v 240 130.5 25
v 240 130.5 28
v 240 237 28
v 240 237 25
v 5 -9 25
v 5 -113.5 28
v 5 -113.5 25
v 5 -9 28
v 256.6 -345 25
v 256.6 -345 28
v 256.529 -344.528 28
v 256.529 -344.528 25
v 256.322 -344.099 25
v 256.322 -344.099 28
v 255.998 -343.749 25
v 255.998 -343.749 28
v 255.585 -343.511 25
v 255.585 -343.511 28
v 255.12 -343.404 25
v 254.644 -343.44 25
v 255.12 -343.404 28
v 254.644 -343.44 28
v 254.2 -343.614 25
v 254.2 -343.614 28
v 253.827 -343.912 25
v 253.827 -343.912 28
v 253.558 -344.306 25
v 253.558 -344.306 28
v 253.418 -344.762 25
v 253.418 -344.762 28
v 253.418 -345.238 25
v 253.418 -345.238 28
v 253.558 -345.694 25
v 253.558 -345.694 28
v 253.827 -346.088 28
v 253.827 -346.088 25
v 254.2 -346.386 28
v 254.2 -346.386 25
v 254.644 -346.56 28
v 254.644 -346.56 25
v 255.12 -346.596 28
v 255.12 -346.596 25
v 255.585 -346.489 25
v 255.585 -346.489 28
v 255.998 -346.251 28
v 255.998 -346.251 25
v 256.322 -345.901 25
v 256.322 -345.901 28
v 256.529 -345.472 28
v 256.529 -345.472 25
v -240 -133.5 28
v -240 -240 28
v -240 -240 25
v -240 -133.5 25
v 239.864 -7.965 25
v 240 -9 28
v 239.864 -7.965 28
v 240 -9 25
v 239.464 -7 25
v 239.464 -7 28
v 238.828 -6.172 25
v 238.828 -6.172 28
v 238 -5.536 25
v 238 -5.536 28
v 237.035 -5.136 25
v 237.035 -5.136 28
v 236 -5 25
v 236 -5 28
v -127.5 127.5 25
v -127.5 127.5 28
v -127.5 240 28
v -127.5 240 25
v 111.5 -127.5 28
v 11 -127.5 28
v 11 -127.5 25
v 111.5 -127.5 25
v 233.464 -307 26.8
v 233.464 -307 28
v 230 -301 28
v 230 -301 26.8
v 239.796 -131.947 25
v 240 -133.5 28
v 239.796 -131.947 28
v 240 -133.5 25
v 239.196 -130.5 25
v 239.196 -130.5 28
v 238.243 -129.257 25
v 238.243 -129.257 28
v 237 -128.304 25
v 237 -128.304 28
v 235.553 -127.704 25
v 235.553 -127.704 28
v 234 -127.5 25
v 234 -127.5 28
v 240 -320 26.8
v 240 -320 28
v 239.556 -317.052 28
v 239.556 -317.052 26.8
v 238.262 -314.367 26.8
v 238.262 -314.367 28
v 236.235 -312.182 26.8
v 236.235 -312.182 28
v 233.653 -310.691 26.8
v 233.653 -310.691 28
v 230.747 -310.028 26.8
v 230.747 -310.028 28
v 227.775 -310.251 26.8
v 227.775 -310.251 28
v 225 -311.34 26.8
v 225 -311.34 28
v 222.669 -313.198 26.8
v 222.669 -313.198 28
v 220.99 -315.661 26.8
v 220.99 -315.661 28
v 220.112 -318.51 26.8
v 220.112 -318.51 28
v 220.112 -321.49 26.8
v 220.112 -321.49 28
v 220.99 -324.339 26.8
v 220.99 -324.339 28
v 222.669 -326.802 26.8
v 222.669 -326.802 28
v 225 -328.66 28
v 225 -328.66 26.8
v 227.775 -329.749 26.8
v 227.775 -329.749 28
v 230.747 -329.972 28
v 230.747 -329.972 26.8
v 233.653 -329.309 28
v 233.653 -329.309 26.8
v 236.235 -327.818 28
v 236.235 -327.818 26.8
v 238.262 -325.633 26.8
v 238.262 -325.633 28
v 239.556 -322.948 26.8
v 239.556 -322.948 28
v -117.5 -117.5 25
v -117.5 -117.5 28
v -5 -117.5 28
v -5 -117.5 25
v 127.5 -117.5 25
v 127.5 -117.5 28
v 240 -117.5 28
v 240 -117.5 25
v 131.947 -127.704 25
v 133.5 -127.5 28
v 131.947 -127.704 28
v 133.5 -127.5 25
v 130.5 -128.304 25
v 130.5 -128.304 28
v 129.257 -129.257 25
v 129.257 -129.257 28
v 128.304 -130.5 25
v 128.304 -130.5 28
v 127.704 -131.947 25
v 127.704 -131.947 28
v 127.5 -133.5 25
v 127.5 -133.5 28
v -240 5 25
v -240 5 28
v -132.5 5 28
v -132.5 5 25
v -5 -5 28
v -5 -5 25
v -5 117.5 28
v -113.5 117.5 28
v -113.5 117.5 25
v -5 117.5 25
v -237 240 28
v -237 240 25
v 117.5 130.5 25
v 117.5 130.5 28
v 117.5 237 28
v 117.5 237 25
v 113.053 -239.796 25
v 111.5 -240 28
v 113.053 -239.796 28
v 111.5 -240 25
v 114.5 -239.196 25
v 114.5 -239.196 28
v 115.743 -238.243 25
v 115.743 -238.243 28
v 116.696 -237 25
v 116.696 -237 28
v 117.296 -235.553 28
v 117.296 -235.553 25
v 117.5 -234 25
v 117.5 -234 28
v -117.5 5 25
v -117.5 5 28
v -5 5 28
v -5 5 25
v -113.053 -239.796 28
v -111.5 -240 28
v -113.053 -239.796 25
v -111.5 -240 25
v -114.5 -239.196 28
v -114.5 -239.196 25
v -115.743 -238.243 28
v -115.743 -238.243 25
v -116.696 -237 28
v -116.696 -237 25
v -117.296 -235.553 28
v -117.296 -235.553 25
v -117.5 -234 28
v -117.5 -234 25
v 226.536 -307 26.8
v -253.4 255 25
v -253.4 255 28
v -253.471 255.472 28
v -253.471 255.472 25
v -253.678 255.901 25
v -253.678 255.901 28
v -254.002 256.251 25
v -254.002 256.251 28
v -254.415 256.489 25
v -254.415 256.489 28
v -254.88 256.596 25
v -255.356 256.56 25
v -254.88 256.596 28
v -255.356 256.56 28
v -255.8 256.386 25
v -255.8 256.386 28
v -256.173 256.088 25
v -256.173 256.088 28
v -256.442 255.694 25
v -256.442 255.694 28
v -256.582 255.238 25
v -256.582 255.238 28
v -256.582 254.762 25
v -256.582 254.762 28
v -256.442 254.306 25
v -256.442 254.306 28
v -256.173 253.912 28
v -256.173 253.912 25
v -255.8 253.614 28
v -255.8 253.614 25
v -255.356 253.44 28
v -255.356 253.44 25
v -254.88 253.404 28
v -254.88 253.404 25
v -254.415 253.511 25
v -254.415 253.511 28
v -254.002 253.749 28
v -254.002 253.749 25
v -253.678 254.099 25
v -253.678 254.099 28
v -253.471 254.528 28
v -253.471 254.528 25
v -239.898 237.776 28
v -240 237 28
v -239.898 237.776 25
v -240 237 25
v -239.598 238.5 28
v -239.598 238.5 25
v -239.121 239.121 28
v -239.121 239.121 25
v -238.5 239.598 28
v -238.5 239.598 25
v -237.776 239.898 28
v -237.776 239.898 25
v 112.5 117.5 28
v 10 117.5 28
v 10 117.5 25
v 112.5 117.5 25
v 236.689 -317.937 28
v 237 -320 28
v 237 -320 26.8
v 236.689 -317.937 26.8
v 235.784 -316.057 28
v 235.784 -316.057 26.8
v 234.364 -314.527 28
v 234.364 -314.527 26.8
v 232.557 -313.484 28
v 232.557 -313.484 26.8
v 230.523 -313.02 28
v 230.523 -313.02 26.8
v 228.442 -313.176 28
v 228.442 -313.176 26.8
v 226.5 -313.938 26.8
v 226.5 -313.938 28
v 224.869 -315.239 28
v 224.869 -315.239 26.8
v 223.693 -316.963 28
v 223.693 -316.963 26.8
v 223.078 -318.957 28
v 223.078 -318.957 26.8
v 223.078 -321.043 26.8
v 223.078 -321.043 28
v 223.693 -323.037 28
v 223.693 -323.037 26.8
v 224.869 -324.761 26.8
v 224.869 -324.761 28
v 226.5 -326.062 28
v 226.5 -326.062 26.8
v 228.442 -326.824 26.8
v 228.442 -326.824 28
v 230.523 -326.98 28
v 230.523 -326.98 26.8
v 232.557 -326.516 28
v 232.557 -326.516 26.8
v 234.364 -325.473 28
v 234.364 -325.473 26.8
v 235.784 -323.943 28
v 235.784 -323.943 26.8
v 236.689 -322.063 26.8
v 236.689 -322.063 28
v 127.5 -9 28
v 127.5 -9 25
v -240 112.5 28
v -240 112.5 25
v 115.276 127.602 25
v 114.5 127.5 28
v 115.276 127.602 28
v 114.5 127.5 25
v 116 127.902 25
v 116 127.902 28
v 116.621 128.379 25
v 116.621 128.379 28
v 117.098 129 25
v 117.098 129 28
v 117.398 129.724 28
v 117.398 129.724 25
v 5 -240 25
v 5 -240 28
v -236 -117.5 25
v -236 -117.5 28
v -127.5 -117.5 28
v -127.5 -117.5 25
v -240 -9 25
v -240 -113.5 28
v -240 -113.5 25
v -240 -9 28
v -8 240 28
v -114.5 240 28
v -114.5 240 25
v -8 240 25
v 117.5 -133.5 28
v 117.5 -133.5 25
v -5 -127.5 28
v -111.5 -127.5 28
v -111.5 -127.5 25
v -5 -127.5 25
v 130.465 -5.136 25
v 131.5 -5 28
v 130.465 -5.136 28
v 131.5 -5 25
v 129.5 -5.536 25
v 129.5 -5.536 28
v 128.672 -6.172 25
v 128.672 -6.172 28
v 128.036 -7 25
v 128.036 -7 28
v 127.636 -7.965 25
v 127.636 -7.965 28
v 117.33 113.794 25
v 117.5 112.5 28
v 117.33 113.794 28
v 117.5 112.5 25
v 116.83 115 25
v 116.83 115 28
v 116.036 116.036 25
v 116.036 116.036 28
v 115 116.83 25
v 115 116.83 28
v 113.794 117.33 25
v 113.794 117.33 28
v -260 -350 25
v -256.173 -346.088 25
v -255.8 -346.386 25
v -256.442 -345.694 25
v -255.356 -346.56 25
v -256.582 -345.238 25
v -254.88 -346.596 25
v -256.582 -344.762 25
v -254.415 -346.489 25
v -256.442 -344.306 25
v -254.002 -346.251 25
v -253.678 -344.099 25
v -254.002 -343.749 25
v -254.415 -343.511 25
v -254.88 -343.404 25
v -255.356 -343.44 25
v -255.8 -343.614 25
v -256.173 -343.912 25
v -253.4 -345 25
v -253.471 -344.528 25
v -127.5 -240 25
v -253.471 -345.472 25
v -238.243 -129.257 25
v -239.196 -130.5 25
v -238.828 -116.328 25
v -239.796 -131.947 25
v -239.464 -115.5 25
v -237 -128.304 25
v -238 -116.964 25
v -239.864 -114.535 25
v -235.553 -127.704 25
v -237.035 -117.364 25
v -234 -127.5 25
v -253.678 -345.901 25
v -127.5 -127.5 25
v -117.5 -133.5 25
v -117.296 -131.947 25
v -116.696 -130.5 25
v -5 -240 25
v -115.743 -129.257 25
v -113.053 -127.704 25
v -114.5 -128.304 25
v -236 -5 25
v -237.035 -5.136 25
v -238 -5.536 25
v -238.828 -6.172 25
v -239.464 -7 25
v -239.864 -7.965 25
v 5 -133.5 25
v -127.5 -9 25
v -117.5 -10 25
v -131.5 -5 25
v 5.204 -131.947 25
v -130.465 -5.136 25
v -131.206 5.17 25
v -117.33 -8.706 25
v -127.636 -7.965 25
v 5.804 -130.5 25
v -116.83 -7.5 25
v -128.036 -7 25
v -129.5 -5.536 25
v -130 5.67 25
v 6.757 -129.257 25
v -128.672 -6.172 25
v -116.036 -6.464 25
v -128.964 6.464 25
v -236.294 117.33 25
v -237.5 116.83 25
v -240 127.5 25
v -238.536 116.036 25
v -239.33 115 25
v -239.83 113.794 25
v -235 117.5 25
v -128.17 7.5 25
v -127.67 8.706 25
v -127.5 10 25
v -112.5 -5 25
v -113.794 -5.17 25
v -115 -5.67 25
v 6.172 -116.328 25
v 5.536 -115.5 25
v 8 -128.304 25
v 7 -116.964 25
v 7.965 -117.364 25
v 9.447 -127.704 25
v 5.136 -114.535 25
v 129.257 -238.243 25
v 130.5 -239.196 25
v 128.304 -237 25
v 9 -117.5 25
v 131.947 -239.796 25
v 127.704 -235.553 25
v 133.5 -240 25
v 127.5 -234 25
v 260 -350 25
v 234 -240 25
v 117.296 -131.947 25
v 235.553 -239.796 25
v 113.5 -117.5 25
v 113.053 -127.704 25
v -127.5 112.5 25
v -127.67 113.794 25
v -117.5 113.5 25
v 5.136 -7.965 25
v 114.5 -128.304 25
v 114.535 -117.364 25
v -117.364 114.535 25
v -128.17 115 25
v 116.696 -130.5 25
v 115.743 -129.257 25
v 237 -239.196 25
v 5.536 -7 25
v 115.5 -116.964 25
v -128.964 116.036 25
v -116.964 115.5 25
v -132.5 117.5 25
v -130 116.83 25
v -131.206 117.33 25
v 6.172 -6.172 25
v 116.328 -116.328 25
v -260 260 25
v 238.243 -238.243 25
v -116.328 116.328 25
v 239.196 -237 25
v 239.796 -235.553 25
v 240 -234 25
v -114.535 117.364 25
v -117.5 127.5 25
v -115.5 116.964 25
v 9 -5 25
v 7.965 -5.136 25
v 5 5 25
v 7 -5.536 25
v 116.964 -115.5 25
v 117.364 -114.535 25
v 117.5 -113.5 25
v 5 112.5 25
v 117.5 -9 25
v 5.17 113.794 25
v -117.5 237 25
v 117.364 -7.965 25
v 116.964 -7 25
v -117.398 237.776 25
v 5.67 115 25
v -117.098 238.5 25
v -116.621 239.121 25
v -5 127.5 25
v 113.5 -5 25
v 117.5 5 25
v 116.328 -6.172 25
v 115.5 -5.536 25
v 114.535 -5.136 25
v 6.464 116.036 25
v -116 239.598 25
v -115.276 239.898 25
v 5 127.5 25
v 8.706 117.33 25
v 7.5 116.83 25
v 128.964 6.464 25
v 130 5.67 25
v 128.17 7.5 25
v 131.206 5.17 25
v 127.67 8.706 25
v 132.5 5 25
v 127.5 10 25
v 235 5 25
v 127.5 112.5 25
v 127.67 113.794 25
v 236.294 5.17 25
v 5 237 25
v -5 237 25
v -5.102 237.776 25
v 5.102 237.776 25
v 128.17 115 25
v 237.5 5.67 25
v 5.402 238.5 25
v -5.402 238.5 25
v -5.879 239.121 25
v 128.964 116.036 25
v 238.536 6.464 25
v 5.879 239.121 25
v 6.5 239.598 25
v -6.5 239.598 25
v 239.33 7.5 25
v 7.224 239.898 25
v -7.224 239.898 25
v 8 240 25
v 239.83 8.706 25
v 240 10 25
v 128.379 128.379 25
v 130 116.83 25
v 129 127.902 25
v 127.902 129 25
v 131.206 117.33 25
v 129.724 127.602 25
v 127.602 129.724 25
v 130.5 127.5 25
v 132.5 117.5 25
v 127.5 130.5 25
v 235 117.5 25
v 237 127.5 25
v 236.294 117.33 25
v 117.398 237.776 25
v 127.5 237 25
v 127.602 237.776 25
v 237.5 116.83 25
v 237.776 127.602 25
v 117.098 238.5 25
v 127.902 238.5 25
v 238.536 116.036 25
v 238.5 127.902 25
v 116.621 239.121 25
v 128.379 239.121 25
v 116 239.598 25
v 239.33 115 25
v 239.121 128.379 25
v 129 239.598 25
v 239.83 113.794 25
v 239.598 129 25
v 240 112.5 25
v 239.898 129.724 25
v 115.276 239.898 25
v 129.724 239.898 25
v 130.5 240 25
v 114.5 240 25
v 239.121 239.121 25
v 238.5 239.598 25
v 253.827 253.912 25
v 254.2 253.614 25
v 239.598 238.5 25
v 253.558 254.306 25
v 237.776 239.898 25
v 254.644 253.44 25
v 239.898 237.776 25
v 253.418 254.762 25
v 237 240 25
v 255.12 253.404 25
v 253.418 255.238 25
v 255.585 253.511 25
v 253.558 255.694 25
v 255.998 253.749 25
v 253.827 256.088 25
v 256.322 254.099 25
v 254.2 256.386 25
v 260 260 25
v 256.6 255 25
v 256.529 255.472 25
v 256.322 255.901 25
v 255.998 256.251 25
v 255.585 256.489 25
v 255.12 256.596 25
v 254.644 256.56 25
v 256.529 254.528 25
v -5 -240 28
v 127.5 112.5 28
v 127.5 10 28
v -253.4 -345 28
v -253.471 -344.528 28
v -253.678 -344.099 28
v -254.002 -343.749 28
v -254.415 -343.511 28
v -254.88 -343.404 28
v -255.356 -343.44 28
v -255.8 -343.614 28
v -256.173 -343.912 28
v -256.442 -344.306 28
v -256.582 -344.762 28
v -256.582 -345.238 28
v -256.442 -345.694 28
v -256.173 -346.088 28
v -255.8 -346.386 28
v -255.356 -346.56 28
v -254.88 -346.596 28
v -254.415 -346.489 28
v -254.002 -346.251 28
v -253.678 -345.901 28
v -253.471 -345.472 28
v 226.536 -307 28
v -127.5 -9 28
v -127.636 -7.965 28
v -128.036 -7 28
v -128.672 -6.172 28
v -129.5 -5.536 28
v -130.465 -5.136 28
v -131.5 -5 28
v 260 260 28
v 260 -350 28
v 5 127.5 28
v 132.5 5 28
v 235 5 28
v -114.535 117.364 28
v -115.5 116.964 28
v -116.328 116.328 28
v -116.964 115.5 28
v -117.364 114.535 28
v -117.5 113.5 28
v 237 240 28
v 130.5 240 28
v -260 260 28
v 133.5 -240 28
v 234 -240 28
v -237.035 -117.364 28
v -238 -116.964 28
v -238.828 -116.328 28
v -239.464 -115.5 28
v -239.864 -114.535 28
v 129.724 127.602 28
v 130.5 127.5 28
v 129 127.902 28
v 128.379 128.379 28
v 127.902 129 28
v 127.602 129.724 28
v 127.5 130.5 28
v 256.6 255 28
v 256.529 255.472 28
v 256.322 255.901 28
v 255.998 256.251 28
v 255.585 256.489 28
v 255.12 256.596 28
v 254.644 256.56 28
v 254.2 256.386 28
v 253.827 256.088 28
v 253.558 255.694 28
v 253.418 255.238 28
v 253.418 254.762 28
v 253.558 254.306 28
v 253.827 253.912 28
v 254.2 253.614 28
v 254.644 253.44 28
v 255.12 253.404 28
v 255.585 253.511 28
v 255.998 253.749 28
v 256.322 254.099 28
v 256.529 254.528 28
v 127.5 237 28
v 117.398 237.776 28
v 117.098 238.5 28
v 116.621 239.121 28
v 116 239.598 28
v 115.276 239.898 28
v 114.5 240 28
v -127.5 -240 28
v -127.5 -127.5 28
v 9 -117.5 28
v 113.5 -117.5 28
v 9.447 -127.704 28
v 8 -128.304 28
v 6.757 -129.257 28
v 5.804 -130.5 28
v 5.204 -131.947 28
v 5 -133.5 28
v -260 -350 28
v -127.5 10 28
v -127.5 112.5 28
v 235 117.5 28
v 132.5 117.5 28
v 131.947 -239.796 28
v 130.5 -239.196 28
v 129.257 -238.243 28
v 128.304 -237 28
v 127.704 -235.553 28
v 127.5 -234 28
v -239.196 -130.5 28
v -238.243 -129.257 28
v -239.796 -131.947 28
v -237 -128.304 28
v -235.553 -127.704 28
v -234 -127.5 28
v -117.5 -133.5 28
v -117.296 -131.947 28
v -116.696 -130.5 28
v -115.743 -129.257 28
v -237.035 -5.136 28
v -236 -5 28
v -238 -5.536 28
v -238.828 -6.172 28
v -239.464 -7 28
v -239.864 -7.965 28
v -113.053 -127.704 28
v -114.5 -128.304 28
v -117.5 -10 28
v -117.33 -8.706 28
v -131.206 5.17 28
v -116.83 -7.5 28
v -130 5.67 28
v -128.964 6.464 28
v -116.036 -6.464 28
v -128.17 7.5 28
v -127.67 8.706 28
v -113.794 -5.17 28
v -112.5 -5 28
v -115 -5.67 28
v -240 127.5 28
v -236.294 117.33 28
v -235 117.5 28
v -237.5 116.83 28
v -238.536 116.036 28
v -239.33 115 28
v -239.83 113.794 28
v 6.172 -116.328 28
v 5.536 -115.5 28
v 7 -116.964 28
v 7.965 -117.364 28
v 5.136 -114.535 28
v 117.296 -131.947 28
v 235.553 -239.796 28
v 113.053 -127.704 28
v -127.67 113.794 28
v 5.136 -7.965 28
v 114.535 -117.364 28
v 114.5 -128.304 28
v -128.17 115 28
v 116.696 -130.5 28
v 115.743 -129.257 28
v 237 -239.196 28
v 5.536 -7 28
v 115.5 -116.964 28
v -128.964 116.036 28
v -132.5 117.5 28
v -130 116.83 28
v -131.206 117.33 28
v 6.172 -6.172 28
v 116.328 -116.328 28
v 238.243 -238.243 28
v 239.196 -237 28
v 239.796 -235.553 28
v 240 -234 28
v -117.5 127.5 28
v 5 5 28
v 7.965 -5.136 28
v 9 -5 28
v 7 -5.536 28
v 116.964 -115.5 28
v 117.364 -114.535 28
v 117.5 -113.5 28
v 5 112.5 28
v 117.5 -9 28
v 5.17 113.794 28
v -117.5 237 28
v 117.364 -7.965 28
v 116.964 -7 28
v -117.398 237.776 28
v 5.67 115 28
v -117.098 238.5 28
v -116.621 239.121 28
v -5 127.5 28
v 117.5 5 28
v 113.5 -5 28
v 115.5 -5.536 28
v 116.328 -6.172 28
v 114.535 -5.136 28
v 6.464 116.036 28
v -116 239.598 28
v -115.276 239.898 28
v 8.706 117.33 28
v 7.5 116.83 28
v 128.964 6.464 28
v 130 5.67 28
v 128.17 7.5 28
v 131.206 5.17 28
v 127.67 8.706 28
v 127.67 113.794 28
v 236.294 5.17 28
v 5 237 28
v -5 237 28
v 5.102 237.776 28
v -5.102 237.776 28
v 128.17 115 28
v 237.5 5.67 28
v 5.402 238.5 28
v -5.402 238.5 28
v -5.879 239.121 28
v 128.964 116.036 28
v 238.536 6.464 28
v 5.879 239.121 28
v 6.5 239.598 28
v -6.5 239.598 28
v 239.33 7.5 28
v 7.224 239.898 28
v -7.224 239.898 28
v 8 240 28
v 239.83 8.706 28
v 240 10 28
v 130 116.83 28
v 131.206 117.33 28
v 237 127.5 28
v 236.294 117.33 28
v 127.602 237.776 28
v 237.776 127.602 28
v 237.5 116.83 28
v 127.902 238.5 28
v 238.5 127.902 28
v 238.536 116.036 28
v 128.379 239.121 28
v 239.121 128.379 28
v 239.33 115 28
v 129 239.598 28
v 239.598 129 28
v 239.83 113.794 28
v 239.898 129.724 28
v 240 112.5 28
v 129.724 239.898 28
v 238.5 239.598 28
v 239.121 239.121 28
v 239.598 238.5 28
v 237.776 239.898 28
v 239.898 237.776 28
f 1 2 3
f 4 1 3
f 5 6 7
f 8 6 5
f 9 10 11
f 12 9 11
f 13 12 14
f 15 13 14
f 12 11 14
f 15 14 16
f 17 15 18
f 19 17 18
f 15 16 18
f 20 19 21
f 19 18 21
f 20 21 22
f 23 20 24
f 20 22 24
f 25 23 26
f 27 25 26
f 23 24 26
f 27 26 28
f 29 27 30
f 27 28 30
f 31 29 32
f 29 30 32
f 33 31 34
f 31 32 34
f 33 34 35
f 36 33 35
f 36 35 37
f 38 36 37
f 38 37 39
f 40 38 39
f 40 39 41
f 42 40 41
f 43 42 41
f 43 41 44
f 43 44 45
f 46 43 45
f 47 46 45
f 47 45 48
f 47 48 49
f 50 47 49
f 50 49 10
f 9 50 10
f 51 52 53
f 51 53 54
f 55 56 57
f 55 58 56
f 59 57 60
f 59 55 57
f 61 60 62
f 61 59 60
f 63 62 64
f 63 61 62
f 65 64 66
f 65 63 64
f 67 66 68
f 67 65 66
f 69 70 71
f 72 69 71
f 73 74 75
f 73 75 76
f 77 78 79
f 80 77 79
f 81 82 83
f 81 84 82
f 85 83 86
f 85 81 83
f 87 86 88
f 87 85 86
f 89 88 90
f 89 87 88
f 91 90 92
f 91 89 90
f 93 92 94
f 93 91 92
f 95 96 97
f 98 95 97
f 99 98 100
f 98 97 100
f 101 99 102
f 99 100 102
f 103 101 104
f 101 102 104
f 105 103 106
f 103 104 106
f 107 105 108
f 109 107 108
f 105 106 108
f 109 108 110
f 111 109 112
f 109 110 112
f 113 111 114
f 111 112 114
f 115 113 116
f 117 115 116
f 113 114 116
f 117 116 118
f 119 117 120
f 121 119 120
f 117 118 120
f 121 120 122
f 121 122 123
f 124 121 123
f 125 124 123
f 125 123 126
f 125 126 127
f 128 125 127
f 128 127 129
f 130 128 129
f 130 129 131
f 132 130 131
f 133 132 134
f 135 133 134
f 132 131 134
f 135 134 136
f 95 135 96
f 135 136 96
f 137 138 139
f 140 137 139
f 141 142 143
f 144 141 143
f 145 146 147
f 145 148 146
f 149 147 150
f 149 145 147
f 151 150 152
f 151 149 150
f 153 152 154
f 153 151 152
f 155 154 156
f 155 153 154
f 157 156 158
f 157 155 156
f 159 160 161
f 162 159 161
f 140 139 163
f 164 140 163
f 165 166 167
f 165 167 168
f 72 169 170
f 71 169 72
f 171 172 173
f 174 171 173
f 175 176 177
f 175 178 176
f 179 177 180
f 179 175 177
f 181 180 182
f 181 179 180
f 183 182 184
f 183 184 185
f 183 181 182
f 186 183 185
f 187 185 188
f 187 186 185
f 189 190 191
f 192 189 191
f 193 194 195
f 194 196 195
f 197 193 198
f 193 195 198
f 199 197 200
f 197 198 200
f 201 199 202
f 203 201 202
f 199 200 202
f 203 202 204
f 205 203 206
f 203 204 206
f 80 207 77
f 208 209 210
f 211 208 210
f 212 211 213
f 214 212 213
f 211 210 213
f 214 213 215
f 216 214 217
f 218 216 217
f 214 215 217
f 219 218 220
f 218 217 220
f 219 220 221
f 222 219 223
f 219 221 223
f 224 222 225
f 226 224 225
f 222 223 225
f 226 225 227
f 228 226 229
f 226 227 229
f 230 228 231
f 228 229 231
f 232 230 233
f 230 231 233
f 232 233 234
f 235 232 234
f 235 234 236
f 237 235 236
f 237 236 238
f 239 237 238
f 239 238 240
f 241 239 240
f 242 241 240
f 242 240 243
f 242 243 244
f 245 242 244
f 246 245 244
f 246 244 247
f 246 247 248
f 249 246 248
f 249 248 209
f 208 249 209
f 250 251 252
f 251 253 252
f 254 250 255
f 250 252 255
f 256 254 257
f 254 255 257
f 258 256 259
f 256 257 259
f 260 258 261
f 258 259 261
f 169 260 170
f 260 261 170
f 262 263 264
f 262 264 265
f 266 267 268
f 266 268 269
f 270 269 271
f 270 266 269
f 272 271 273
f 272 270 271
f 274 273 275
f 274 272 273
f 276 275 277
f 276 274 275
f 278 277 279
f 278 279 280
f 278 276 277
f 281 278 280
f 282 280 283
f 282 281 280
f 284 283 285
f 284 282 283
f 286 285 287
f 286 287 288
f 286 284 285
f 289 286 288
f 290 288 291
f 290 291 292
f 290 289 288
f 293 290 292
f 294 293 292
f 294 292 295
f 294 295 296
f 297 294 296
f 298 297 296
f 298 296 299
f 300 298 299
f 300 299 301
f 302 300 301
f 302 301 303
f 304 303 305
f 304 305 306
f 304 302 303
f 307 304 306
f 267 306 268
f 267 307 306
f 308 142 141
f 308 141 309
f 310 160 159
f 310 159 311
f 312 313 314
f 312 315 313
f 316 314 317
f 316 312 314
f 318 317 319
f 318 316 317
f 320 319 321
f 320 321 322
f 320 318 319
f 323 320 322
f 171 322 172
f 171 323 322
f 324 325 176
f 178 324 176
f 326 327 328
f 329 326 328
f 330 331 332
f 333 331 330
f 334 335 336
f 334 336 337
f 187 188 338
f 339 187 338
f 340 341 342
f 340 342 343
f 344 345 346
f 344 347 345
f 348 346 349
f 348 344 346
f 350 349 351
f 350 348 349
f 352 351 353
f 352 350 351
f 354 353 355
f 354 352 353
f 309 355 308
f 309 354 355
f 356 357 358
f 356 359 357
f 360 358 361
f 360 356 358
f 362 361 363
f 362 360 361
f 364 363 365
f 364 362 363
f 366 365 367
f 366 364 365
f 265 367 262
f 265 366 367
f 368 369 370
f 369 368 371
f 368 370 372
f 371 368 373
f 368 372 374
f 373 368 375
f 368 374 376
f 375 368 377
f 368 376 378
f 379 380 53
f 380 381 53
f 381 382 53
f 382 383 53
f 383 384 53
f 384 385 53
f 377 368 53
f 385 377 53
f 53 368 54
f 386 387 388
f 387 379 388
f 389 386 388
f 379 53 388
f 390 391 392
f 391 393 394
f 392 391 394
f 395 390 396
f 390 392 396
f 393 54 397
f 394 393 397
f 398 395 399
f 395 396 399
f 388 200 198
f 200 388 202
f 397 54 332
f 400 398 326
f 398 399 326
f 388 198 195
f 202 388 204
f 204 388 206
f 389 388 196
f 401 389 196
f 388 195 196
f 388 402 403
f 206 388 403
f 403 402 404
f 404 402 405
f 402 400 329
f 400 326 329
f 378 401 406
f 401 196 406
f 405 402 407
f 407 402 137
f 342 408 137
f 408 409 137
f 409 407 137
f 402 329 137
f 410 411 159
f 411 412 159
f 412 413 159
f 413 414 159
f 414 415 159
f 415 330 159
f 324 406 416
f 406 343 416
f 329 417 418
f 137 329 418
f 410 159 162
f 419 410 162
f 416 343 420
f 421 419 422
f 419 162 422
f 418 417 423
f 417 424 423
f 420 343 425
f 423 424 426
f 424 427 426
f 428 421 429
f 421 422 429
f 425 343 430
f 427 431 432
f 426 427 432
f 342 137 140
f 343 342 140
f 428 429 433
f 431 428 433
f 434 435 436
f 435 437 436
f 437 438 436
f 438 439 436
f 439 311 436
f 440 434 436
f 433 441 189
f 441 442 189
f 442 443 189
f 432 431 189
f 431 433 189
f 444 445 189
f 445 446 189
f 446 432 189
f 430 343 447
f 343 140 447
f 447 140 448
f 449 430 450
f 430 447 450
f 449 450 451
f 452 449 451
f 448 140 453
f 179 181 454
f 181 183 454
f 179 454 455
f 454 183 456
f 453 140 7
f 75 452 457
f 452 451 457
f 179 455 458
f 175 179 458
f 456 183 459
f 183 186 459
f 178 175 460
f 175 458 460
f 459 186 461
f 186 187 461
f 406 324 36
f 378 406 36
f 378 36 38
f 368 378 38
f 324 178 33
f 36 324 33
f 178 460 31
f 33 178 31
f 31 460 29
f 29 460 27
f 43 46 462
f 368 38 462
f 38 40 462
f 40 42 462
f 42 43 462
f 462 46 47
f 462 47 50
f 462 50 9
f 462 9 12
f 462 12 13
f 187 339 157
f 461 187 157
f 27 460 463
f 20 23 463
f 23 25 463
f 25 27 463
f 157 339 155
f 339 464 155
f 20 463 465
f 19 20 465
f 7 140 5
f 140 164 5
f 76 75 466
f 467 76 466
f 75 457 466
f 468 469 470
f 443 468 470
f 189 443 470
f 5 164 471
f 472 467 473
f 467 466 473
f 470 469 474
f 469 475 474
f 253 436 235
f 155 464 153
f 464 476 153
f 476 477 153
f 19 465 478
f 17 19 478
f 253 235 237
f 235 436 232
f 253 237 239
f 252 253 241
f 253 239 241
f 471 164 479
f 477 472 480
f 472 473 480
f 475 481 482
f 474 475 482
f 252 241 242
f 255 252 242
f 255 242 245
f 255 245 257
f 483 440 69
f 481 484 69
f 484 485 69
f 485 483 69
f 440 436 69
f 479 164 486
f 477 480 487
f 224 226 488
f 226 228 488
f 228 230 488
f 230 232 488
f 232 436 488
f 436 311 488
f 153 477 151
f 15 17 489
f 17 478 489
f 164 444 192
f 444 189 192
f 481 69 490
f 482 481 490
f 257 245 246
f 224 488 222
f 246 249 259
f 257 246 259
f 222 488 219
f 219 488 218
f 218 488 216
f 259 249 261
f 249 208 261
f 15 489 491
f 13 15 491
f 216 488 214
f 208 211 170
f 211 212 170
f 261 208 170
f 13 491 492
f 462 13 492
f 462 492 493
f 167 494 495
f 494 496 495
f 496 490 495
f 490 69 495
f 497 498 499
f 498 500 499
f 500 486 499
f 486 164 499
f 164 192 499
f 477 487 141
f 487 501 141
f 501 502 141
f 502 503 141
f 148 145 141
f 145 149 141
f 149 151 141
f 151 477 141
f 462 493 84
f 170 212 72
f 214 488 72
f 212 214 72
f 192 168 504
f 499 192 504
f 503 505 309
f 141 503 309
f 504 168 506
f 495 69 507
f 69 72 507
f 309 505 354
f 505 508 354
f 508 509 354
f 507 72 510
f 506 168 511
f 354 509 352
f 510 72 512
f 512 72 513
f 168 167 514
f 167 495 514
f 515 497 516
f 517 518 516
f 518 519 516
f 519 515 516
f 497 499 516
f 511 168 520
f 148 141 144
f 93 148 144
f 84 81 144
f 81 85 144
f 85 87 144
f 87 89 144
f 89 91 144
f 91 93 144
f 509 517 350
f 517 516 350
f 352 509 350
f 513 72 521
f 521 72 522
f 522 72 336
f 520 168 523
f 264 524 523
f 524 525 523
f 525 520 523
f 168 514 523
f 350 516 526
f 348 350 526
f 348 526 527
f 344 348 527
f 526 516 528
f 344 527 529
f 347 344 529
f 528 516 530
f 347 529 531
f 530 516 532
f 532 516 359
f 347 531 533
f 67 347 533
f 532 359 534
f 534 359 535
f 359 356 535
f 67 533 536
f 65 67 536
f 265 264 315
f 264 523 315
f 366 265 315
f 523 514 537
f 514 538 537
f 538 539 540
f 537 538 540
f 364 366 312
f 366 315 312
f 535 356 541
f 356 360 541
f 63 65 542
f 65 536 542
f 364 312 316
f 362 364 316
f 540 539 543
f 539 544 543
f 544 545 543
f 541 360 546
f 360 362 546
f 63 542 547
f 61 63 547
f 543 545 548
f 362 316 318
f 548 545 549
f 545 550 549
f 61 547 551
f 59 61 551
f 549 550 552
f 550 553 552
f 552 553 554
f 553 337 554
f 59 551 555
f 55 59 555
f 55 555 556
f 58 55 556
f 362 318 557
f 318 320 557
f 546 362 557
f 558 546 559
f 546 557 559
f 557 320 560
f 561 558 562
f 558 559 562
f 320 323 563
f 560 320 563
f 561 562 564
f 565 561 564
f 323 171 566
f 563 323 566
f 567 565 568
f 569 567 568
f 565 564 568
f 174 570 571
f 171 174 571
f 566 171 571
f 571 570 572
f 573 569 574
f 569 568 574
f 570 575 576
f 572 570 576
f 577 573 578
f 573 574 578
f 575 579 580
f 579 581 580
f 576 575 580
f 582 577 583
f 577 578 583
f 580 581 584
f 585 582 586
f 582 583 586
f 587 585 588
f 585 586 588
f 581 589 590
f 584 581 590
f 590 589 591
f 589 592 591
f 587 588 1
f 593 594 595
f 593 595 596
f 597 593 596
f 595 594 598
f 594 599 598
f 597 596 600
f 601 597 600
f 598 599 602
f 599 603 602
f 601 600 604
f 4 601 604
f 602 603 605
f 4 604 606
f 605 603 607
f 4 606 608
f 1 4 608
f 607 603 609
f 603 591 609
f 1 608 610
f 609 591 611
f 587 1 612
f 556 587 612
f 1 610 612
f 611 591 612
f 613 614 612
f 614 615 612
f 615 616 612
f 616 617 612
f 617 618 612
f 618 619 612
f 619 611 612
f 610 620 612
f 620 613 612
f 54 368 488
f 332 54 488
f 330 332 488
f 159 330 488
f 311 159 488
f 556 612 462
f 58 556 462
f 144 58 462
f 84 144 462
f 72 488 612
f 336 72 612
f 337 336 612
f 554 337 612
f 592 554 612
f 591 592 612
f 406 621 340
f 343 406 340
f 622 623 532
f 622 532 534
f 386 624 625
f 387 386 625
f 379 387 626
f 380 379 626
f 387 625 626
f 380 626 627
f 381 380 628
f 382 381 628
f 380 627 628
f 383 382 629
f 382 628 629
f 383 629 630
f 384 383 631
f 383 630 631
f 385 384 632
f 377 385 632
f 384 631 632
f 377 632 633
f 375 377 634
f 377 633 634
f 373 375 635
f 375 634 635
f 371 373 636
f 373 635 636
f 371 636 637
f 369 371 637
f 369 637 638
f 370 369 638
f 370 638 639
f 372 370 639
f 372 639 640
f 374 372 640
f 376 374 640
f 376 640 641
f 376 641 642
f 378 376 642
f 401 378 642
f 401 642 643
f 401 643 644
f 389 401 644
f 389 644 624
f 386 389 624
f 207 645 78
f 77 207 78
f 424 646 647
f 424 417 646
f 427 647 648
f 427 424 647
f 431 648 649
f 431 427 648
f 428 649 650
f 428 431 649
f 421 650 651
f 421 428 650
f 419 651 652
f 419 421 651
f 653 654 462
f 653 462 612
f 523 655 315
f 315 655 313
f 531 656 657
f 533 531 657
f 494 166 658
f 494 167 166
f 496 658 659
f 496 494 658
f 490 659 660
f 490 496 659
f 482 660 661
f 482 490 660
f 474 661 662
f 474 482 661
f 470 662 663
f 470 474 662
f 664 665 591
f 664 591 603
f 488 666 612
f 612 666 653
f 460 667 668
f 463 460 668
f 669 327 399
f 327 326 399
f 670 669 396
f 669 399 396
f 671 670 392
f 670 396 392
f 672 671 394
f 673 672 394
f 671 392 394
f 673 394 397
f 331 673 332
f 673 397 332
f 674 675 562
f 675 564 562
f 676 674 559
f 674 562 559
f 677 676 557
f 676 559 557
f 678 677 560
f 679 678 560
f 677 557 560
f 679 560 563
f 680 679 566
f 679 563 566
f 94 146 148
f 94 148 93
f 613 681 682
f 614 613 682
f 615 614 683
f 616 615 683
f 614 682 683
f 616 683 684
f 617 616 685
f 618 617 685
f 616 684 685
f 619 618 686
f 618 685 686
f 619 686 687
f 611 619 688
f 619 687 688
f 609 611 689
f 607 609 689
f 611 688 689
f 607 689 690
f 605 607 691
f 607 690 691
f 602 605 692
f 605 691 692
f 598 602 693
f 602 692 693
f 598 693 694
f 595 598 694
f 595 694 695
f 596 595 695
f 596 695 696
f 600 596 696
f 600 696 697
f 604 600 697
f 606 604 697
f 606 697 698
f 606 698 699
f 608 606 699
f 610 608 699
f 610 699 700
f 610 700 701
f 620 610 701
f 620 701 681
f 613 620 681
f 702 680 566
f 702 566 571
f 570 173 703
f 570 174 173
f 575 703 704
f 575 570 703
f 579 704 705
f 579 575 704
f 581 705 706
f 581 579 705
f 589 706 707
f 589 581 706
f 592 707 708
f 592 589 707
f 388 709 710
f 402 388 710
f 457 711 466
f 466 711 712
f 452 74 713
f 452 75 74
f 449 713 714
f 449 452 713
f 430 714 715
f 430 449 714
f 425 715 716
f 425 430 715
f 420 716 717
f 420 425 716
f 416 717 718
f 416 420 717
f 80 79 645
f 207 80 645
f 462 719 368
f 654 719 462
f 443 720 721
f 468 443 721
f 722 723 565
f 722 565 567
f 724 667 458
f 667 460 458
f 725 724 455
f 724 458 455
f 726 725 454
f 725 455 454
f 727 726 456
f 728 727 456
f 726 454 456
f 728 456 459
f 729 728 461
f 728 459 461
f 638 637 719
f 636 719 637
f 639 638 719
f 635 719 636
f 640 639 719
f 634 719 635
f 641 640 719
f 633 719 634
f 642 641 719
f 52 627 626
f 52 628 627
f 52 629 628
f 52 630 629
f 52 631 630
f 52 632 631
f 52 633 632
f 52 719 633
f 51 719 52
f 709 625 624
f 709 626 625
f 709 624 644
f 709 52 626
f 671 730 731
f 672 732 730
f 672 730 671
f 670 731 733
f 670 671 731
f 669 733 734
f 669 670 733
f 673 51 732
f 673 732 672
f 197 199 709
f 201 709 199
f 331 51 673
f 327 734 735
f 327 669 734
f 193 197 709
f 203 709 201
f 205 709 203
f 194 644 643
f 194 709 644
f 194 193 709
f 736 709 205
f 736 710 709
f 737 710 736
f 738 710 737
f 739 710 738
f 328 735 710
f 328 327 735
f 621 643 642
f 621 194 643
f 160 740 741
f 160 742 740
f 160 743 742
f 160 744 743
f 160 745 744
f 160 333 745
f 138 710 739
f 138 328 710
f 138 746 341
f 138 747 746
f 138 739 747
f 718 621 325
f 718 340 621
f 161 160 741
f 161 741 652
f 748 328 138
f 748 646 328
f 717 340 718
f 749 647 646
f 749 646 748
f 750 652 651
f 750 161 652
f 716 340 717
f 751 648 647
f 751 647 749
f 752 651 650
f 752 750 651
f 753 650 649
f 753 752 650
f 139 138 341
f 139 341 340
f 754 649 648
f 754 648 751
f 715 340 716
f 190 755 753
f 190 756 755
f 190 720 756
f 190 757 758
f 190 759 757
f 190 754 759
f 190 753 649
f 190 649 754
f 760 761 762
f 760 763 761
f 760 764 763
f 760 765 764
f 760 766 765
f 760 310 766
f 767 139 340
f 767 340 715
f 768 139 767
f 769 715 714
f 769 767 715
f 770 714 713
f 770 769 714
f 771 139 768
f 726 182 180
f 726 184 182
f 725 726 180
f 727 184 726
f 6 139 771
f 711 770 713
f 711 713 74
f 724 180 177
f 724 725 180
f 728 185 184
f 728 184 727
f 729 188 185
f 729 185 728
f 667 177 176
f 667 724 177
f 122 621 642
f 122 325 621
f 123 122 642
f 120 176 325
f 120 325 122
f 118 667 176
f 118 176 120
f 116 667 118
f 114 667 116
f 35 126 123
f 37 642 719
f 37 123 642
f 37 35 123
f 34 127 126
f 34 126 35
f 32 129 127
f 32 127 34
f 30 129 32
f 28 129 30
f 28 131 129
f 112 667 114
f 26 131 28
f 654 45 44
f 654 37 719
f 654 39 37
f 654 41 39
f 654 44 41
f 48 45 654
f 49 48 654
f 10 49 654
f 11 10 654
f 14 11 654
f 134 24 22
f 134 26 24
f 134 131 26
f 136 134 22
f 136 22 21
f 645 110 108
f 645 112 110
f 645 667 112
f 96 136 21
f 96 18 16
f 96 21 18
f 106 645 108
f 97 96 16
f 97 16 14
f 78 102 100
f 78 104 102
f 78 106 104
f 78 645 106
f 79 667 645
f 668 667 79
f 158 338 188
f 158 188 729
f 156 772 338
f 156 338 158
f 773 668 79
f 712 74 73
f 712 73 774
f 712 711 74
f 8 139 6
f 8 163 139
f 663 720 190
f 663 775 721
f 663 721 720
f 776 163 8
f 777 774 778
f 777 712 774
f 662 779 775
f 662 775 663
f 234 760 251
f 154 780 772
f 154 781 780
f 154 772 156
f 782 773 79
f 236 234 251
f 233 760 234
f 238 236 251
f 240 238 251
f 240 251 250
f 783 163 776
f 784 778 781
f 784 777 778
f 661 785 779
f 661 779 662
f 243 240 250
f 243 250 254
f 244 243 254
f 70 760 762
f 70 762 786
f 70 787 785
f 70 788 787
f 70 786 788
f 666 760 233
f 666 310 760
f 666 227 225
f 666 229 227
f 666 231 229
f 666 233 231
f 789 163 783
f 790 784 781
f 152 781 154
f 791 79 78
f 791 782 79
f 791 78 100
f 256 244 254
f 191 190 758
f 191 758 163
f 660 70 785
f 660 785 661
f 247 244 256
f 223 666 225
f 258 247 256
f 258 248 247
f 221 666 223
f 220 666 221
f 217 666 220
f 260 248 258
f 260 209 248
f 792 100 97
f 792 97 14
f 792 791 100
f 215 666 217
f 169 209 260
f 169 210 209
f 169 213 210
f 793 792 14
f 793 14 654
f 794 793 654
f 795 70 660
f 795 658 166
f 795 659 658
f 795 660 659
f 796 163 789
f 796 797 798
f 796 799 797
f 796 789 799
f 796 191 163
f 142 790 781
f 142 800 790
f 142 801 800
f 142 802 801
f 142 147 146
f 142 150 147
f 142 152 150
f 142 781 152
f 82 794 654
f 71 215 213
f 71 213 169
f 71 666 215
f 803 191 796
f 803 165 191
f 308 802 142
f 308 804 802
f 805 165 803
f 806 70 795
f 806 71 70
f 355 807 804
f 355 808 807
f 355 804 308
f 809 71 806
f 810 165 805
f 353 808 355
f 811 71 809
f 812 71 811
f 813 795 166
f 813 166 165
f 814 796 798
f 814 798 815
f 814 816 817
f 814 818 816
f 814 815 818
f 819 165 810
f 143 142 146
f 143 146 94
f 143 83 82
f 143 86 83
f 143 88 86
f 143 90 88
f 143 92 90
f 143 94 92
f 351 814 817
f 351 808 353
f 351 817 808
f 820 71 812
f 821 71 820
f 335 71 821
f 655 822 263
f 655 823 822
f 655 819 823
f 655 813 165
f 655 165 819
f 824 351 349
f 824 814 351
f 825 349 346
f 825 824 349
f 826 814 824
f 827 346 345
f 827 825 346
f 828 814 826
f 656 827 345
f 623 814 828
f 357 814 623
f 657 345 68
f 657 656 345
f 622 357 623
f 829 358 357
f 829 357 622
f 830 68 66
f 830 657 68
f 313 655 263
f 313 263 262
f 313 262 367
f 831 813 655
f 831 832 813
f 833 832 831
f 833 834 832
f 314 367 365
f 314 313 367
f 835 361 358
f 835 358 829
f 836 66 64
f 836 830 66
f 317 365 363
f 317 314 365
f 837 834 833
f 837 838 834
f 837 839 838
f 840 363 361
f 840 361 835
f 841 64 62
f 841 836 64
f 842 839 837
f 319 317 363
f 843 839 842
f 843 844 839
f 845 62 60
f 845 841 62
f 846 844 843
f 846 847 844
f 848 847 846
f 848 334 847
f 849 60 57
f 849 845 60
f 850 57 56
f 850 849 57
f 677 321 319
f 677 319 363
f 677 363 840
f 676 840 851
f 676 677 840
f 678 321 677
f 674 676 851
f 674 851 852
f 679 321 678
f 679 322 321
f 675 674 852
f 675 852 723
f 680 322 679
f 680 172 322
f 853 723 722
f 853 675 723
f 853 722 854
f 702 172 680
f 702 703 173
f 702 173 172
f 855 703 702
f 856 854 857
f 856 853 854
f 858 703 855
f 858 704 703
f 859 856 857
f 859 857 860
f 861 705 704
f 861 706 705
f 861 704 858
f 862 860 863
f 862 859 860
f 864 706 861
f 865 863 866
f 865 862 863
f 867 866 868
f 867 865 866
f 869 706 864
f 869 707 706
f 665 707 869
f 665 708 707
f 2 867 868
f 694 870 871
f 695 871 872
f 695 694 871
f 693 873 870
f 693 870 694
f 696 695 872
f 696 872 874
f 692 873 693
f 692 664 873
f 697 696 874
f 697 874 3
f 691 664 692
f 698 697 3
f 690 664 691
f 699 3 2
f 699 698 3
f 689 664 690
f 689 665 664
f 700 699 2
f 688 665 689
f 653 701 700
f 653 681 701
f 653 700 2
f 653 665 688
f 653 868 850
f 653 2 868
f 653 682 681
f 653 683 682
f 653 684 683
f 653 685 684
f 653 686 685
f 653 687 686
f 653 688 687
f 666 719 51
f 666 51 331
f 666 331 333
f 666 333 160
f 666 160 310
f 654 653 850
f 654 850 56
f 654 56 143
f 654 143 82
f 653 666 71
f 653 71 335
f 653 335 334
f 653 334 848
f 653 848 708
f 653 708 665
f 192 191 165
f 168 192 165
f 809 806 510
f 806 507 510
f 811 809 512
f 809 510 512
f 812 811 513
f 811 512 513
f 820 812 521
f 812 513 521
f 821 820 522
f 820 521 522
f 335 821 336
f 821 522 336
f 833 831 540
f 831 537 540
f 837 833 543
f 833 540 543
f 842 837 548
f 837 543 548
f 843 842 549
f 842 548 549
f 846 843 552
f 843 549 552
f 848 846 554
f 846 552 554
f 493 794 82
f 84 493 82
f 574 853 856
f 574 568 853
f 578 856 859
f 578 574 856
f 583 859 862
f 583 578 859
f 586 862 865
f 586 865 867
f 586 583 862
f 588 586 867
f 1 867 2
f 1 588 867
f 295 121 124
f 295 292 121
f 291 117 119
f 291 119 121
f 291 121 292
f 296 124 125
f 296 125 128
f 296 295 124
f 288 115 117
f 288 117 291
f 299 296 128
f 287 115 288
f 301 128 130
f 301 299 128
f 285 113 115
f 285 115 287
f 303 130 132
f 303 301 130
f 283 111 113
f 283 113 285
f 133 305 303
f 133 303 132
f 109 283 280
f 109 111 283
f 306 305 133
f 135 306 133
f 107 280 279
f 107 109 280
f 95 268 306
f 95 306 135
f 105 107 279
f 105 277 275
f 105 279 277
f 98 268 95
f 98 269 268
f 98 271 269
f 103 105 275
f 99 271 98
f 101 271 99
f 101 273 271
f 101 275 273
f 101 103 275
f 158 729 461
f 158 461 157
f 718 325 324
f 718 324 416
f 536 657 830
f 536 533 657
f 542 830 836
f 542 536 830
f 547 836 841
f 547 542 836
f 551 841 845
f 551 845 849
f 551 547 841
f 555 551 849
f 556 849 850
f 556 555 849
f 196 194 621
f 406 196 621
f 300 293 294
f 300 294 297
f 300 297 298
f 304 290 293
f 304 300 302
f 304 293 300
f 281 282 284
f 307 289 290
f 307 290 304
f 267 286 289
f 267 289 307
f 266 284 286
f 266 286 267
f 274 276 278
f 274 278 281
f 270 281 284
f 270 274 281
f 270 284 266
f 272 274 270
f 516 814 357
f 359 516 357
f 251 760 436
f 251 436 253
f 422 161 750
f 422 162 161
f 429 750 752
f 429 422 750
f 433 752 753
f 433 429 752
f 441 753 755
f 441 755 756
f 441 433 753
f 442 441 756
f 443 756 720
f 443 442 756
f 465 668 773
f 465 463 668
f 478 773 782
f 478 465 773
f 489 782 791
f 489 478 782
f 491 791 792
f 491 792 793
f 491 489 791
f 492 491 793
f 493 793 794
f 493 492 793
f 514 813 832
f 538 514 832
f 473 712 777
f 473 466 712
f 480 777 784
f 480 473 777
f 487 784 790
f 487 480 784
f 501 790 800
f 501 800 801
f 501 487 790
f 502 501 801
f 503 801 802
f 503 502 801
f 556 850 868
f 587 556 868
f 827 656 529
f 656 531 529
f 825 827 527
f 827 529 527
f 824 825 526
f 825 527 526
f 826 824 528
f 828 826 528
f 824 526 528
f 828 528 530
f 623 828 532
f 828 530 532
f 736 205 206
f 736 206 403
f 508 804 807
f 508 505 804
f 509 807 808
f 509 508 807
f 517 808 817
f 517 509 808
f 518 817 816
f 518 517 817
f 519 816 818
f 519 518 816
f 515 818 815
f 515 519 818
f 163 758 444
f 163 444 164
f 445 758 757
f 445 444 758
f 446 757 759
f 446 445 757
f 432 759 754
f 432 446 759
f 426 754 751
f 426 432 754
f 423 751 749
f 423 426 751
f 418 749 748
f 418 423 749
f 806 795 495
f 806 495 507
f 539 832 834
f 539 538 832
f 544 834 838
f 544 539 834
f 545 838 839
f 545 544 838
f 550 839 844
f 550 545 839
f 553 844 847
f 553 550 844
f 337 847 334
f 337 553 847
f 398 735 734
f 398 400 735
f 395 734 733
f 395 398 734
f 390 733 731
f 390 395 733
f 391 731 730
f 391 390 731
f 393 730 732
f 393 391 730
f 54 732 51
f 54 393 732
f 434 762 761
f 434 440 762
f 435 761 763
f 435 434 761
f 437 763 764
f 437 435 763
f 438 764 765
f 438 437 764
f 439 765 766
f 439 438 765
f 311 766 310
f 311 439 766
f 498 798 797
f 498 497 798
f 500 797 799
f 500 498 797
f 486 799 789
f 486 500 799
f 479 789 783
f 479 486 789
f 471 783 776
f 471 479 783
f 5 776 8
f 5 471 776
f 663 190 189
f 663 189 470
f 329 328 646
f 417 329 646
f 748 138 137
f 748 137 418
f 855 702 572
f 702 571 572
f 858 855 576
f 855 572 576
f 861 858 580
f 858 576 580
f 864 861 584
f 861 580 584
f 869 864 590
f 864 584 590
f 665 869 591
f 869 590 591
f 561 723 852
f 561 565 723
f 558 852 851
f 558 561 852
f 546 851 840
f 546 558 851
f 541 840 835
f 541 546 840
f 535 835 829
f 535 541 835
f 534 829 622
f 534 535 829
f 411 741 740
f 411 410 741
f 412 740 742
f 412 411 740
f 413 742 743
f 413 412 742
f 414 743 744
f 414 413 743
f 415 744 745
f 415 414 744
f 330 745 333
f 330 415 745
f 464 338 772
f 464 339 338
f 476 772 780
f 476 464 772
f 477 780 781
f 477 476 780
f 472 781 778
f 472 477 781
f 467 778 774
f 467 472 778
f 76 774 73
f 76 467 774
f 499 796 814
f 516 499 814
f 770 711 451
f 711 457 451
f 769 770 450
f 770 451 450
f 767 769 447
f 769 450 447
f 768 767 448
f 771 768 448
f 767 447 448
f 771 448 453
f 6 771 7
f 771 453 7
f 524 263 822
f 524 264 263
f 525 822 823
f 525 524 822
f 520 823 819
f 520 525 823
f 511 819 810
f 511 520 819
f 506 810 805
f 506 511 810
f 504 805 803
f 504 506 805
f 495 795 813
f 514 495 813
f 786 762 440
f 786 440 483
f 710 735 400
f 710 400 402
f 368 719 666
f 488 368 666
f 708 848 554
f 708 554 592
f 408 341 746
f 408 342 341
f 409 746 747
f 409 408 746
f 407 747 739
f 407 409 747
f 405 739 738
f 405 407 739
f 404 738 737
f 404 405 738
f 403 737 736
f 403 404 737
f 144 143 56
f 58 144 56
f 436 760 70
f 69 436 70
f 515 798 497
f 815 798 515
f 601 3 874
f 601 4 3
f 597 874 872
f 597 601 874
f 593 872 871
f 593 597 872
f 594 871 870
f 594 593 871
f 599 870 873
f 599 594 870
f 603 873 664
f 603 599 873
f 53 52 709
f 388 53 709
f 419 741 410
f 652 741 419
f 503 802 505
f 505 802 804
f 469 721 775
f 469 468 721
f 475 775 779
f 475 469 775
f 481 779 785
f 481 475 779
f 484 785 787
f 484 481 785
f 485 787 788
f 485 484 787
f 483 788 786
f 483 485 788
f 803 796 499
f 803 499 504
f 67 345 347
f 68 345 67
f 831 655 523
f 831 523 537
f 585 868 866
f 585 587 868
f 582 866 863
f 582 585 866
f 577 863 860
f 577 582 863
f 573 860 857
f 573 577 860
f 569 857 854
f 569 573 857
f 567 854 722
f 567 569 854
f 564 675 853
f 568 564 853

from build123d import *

# Parameters (mm, degrees)
SKETCH_W            = 520
SKETCH_H            = 610
PAD_DEPTH           = 3
SKETCH001_W         = 112.5
SKETCH001_H         = 112.5
POCKET_DEPTH        = 3.001
LINEARPATTERN_COUNT = 4
LINEARPATTERN_PITCH = 122.5
FILLET_R            = 3
FILLET001_R         = 4
FILLET002_R         = 5
FILLET003_R         = 6
SKETCH002_R         = 1.6
POCKET001_DEPTH     = 5
SKETCH003_R         = 10
SKETCH003_R_2       = 7
POCKET002_DEPTH     = 1.2


with BuildPart() as part:
    # Sketch → Pad (new body)
    with BuildSketch(Plane.XY):
        with Locations((0, -45)):
            Rectangle(SKETCH_W, SKETCH_H)
    extrude(amount=-PAD_DEPTH)

    # Sketch001 (on Face5 of Pad) → Pocket (cut, through all)
    with BuildSketch(Plane.XY):
        with Locations((-183.75, 183.75)):
            Rectangle(SKETCH001_W, SKETCH001_H)
        with Locations((-61.25, 183.75)):
            Rectangle(SKETCH001_W, SKETCH001_H)
        with Locations((61.25, 183.75)):
            Rectangle(SKETCH001_W, SKETCH001_H)
        with Locations((183.75, 183.75)):
            Rectangle(SKETCH001_W, SKETCH001_H)
    pocket = extrude(amount=-POCKET_DEPTH, mode=Mode.SUBTRACT)

    # LinearPattern: Pocket ×4
    with Locations(*[(0, -i * LINEARPATTERN_PITCH, 0) for i in range(1, LINEARPATTERN_COUNT)]):
        add(pocket, mode=Mode.SUBTRACT)

    # Fillet
    fillet_edges = [part.edges().sort_by_distance(p)[0] for p in [
        (-240, 240, -1.5),
        (-117.5, 240, -1.5),
        (-5, 240, -1.5),
        (5, 240, -1.5),
        (117.5, 240, -1.5),
        (117.5, 127.5, -1.5),
        (240, 127.5, -1.5),
        (240, 240, -1.5),
        (127.5, 240, -1.5),
        (127.5, 127.5, -1.5),
    ]]
    fillet(fillet_edges, radius=FILLET_R)

    # Fillet001
    fillet001_edges = [part.edges().sort_by_distance(p)[0] for p in [
        (-117.5, 117.5, -1.5),
        (127.5, -5, -1.5),
        (240, -5, -1.5),
        (-240, -117.5, -1.5),
        (-240, -5, -1.5),
        (-127.5, -5, -1.5),
        (117.5, -5, -1.5),
        (117.5, -117.5, -1.5),
        (5, -117.5, -1.5),
        (5, -5, -1.5),
    ]]
    fillet(fillet001_edges, radius=FILLET001_R)

    # Fillet002
    fillet002_edges = [part.edges().sort_by_distance(p)[0] for p in [
        (-117.5, -5, -1.5),
        (5, 117.5, -1.5),
        (117.5, 117.5, -1.5),
        (-240, 117.5, -1.5),
        (-127.5, 117.5, -1.5),
        (-127.5, 5, -1.5),
        (240, 5, -1.5),
        (127.5, 5, -1.5),
        (127.5, 117.5, -1.5),
        (240, 117.5, -1.5),
    ]]
    fillet(fillet002_edges, radius=FILLET002_R)

    # Fillet003
    fillet003_edges = [part.edges().sort_by_distance(p)[0] for p in [
        (-240, -127.5, -1.5),
        (-117.5, -127.5, -1.5),
        (-117.5, -240, -1.5),
        (5, -127.5, -1.5),
        (117.5, -127.5, -1.5),
        (117.5, -240, -1.5),
        (127.5, -127.5, -1.5),
        (240, -127.5, -1.5),
        (240, -240, -1.5),
        (127.5, -240, -1.5),
    ]]
    fillet(fillet003_edges, radius=FILLET003_R)

    # Sketch002 (on Face1 of Fillet003) → Pocket001 (cut)
    with BuildSketch(Plane.XY):
        with Locations((-255, 255)):
            Circle(SKETCH002_R)
        with Locations((255, 255)):
            Circle(SKETCH002_R)
        with Locations((255, -345)):
            Circle(SKETCH002_R)
        with Locations((-255, -345)):
            Circle(SKETCH002_R)
    extrude(amount=-POCKET001_DEPTH, mode=Mode.SUBTRACT)

    # Sketch003 (on Face1 of Pocket001) → Pocket002 (cut)
    with BuildSketch(Plane.XY):
        with Locations((230, -320)):
            Circle(SKETCH003_R)
        with Locations((230, -320)):
            Circle(SKETCH003_R_2, mode=Mode.SUBTRACT)
        Polygon((230, -301), (226.535898, -307), (233.464102, -307), align=None)
    extrude(amount=-POCKET002_DEPTH, mode=Mode.SUBTRACT)


with BuildPart() as part_1:
    # Body placement: moved
    add(part.part.moved(Location((0, 0, 28))))


solid = part_1.part
